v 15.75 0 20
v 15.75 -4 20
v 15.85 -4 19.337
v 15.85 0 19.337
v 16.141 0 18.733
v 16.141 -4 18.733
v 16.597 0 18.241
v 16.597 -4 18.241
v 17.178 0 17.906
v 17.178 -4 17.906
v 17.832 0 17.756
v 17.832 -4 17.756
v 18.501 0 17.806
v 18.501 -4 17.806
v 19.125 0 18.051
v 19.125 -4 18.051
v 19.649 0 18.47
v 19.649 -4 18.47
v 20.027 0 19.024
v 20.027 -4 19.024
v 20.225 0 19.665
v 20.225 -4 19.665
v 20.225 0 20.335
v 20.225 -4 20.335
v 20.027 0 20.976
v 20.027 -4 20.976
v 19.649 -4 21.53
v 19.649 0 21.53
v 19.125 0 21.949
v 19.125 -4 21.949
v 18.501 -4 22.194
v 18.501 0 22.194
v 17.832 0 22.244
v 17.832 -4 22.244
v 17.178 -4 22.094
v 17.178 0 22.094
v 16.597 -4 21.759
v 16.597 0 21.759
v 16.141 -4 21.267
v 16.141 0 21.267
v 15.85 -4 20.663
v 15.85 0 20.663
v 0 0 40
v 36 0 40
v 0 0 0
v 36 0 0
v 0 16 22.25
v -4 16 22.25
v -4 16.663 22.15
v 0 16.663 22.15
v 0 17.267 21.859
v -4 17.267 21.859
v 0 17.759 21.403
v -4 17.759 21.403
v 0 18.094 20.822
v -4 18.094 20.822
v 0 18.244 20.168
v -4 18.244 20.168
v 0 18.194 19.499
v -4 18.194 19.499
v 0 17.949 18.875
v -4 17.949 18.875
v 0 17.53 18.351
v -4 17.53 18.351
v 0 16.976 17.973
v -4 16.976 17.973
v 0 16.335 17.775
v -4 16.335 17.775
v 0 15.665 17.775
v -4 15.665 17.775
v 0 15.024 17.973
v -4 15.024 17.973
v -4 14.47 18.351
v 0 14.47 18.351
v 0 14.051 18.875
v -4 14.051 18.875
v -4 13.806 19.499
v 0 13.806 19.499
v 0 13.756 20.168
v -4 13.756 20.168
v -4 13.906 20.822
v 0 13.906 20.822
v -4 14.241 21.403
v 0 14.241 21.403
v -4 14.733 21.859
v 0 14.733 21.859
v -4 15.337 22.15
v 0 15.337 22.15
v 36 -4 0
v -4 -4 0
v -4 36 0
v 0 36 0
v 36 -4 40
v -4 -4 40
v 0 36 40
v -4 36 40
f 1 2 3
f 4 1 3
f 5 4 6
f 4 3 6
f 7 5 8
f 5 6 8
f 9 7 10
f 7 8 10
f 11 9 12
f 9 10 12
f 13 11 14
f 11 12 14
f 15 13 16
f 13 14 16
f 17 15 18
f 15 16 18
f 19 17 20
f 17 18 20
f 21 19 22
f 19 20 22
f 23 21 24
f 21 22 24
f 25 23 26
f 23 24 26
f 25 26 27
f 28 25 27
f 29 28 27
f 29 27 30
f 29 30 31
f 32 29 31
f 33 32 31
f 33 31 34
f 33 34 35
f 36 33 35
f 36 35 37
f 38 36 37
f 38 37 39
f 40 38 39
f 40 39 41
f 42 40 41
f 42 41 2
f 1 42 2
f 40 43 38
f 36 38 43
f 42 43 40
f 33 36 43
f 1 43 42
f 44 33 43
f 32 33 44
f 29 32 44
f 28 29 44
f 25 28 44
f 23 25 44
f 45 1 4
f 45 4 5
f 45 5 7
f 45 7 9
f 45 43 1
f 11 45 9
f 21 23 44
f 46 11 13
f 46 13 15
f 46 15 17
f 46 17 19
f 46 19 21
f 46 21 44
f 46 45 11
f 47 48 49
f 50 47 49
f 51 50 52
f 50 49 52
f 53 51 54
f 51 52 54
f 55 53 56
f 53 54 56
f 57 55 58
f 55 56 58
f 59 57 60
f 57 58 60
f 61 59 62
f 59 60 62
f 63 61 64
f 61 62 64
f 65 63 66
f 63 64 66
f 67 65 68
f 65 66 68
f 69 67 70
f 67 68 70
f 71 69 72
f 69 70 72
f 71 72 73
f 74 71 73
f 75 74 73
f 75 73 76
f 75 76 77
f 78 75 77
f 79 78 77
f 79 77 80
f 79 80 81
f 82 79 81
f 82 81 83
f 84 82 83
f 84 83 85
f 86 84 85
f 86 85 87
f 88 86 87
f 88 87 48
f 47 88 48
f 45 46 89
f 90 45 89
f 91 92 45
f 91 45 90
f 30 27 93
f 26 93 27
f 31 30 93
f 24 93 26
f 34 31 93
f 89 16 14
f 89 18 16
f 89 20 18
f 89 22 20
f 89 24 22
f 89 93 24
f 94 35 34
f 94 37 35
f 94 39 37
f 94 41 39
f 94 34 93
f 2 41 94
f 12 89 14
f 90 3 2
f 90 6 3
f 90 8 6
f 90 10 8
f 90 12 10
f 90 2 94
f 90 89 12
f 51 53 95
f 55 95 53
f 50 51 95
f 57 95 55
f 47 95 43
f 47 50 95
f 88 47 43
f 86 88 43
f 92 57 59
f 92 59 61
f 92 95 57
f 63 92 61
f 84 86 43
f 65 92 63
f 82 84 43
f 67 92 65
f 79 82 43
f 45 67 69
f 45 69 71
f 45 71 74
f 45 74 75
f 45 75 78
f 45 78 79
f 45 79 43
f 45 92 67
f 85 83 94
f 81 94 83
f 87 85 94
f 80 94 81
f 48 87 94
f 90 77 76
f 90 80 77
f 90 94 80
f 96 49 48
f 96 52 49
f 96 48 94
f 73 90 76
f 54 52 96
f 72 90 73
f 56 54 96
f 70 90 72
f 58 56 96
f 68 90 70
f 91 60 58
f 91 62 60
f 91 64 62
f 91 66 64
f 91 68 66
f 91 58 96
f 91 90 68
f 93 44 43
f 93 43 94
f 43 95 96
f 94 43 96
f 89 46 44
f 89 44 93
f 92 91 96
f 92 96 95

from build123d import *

# Parameters (mm, degrees)
BOSS_EXTRU_1_DEPTH = 40
D_GAGEMENT_M41_D   = 4.5
D_GAGEMENT_M42_D   = 4.5


with BuildPart() as part:
    # Esquisse1 → Boss.-Extru.1 (new body)
    with BuildSketch(Plane.XY):
        Polygon((0, 36), (0, 0), (36, 0), (36, -4), (-4, -4), (-4, 36), align=None)
    extrude(amount=BOSS_EXTRU_1_DEPTH)

    # Dégagement M41 (through all)
    with Locations(Plane(origin=(0, 0, 0), x_dir=(1, 0, 0), z_dir=(0, 1, 0))):
        with Locations((18, -20)):
            Hole(D_GAGEMENT_M41_D / 2)

    # Dégagement M42 (through all)
    with Locations(Plane(origin=(0, 0, 0), x_dir=(0, 0, -1), z_dir=(1, 0, 0))):
        with Locations((-20, 16)):
            Hole(D_GAGEMENT_M42_D / 2)


solid = part.part
